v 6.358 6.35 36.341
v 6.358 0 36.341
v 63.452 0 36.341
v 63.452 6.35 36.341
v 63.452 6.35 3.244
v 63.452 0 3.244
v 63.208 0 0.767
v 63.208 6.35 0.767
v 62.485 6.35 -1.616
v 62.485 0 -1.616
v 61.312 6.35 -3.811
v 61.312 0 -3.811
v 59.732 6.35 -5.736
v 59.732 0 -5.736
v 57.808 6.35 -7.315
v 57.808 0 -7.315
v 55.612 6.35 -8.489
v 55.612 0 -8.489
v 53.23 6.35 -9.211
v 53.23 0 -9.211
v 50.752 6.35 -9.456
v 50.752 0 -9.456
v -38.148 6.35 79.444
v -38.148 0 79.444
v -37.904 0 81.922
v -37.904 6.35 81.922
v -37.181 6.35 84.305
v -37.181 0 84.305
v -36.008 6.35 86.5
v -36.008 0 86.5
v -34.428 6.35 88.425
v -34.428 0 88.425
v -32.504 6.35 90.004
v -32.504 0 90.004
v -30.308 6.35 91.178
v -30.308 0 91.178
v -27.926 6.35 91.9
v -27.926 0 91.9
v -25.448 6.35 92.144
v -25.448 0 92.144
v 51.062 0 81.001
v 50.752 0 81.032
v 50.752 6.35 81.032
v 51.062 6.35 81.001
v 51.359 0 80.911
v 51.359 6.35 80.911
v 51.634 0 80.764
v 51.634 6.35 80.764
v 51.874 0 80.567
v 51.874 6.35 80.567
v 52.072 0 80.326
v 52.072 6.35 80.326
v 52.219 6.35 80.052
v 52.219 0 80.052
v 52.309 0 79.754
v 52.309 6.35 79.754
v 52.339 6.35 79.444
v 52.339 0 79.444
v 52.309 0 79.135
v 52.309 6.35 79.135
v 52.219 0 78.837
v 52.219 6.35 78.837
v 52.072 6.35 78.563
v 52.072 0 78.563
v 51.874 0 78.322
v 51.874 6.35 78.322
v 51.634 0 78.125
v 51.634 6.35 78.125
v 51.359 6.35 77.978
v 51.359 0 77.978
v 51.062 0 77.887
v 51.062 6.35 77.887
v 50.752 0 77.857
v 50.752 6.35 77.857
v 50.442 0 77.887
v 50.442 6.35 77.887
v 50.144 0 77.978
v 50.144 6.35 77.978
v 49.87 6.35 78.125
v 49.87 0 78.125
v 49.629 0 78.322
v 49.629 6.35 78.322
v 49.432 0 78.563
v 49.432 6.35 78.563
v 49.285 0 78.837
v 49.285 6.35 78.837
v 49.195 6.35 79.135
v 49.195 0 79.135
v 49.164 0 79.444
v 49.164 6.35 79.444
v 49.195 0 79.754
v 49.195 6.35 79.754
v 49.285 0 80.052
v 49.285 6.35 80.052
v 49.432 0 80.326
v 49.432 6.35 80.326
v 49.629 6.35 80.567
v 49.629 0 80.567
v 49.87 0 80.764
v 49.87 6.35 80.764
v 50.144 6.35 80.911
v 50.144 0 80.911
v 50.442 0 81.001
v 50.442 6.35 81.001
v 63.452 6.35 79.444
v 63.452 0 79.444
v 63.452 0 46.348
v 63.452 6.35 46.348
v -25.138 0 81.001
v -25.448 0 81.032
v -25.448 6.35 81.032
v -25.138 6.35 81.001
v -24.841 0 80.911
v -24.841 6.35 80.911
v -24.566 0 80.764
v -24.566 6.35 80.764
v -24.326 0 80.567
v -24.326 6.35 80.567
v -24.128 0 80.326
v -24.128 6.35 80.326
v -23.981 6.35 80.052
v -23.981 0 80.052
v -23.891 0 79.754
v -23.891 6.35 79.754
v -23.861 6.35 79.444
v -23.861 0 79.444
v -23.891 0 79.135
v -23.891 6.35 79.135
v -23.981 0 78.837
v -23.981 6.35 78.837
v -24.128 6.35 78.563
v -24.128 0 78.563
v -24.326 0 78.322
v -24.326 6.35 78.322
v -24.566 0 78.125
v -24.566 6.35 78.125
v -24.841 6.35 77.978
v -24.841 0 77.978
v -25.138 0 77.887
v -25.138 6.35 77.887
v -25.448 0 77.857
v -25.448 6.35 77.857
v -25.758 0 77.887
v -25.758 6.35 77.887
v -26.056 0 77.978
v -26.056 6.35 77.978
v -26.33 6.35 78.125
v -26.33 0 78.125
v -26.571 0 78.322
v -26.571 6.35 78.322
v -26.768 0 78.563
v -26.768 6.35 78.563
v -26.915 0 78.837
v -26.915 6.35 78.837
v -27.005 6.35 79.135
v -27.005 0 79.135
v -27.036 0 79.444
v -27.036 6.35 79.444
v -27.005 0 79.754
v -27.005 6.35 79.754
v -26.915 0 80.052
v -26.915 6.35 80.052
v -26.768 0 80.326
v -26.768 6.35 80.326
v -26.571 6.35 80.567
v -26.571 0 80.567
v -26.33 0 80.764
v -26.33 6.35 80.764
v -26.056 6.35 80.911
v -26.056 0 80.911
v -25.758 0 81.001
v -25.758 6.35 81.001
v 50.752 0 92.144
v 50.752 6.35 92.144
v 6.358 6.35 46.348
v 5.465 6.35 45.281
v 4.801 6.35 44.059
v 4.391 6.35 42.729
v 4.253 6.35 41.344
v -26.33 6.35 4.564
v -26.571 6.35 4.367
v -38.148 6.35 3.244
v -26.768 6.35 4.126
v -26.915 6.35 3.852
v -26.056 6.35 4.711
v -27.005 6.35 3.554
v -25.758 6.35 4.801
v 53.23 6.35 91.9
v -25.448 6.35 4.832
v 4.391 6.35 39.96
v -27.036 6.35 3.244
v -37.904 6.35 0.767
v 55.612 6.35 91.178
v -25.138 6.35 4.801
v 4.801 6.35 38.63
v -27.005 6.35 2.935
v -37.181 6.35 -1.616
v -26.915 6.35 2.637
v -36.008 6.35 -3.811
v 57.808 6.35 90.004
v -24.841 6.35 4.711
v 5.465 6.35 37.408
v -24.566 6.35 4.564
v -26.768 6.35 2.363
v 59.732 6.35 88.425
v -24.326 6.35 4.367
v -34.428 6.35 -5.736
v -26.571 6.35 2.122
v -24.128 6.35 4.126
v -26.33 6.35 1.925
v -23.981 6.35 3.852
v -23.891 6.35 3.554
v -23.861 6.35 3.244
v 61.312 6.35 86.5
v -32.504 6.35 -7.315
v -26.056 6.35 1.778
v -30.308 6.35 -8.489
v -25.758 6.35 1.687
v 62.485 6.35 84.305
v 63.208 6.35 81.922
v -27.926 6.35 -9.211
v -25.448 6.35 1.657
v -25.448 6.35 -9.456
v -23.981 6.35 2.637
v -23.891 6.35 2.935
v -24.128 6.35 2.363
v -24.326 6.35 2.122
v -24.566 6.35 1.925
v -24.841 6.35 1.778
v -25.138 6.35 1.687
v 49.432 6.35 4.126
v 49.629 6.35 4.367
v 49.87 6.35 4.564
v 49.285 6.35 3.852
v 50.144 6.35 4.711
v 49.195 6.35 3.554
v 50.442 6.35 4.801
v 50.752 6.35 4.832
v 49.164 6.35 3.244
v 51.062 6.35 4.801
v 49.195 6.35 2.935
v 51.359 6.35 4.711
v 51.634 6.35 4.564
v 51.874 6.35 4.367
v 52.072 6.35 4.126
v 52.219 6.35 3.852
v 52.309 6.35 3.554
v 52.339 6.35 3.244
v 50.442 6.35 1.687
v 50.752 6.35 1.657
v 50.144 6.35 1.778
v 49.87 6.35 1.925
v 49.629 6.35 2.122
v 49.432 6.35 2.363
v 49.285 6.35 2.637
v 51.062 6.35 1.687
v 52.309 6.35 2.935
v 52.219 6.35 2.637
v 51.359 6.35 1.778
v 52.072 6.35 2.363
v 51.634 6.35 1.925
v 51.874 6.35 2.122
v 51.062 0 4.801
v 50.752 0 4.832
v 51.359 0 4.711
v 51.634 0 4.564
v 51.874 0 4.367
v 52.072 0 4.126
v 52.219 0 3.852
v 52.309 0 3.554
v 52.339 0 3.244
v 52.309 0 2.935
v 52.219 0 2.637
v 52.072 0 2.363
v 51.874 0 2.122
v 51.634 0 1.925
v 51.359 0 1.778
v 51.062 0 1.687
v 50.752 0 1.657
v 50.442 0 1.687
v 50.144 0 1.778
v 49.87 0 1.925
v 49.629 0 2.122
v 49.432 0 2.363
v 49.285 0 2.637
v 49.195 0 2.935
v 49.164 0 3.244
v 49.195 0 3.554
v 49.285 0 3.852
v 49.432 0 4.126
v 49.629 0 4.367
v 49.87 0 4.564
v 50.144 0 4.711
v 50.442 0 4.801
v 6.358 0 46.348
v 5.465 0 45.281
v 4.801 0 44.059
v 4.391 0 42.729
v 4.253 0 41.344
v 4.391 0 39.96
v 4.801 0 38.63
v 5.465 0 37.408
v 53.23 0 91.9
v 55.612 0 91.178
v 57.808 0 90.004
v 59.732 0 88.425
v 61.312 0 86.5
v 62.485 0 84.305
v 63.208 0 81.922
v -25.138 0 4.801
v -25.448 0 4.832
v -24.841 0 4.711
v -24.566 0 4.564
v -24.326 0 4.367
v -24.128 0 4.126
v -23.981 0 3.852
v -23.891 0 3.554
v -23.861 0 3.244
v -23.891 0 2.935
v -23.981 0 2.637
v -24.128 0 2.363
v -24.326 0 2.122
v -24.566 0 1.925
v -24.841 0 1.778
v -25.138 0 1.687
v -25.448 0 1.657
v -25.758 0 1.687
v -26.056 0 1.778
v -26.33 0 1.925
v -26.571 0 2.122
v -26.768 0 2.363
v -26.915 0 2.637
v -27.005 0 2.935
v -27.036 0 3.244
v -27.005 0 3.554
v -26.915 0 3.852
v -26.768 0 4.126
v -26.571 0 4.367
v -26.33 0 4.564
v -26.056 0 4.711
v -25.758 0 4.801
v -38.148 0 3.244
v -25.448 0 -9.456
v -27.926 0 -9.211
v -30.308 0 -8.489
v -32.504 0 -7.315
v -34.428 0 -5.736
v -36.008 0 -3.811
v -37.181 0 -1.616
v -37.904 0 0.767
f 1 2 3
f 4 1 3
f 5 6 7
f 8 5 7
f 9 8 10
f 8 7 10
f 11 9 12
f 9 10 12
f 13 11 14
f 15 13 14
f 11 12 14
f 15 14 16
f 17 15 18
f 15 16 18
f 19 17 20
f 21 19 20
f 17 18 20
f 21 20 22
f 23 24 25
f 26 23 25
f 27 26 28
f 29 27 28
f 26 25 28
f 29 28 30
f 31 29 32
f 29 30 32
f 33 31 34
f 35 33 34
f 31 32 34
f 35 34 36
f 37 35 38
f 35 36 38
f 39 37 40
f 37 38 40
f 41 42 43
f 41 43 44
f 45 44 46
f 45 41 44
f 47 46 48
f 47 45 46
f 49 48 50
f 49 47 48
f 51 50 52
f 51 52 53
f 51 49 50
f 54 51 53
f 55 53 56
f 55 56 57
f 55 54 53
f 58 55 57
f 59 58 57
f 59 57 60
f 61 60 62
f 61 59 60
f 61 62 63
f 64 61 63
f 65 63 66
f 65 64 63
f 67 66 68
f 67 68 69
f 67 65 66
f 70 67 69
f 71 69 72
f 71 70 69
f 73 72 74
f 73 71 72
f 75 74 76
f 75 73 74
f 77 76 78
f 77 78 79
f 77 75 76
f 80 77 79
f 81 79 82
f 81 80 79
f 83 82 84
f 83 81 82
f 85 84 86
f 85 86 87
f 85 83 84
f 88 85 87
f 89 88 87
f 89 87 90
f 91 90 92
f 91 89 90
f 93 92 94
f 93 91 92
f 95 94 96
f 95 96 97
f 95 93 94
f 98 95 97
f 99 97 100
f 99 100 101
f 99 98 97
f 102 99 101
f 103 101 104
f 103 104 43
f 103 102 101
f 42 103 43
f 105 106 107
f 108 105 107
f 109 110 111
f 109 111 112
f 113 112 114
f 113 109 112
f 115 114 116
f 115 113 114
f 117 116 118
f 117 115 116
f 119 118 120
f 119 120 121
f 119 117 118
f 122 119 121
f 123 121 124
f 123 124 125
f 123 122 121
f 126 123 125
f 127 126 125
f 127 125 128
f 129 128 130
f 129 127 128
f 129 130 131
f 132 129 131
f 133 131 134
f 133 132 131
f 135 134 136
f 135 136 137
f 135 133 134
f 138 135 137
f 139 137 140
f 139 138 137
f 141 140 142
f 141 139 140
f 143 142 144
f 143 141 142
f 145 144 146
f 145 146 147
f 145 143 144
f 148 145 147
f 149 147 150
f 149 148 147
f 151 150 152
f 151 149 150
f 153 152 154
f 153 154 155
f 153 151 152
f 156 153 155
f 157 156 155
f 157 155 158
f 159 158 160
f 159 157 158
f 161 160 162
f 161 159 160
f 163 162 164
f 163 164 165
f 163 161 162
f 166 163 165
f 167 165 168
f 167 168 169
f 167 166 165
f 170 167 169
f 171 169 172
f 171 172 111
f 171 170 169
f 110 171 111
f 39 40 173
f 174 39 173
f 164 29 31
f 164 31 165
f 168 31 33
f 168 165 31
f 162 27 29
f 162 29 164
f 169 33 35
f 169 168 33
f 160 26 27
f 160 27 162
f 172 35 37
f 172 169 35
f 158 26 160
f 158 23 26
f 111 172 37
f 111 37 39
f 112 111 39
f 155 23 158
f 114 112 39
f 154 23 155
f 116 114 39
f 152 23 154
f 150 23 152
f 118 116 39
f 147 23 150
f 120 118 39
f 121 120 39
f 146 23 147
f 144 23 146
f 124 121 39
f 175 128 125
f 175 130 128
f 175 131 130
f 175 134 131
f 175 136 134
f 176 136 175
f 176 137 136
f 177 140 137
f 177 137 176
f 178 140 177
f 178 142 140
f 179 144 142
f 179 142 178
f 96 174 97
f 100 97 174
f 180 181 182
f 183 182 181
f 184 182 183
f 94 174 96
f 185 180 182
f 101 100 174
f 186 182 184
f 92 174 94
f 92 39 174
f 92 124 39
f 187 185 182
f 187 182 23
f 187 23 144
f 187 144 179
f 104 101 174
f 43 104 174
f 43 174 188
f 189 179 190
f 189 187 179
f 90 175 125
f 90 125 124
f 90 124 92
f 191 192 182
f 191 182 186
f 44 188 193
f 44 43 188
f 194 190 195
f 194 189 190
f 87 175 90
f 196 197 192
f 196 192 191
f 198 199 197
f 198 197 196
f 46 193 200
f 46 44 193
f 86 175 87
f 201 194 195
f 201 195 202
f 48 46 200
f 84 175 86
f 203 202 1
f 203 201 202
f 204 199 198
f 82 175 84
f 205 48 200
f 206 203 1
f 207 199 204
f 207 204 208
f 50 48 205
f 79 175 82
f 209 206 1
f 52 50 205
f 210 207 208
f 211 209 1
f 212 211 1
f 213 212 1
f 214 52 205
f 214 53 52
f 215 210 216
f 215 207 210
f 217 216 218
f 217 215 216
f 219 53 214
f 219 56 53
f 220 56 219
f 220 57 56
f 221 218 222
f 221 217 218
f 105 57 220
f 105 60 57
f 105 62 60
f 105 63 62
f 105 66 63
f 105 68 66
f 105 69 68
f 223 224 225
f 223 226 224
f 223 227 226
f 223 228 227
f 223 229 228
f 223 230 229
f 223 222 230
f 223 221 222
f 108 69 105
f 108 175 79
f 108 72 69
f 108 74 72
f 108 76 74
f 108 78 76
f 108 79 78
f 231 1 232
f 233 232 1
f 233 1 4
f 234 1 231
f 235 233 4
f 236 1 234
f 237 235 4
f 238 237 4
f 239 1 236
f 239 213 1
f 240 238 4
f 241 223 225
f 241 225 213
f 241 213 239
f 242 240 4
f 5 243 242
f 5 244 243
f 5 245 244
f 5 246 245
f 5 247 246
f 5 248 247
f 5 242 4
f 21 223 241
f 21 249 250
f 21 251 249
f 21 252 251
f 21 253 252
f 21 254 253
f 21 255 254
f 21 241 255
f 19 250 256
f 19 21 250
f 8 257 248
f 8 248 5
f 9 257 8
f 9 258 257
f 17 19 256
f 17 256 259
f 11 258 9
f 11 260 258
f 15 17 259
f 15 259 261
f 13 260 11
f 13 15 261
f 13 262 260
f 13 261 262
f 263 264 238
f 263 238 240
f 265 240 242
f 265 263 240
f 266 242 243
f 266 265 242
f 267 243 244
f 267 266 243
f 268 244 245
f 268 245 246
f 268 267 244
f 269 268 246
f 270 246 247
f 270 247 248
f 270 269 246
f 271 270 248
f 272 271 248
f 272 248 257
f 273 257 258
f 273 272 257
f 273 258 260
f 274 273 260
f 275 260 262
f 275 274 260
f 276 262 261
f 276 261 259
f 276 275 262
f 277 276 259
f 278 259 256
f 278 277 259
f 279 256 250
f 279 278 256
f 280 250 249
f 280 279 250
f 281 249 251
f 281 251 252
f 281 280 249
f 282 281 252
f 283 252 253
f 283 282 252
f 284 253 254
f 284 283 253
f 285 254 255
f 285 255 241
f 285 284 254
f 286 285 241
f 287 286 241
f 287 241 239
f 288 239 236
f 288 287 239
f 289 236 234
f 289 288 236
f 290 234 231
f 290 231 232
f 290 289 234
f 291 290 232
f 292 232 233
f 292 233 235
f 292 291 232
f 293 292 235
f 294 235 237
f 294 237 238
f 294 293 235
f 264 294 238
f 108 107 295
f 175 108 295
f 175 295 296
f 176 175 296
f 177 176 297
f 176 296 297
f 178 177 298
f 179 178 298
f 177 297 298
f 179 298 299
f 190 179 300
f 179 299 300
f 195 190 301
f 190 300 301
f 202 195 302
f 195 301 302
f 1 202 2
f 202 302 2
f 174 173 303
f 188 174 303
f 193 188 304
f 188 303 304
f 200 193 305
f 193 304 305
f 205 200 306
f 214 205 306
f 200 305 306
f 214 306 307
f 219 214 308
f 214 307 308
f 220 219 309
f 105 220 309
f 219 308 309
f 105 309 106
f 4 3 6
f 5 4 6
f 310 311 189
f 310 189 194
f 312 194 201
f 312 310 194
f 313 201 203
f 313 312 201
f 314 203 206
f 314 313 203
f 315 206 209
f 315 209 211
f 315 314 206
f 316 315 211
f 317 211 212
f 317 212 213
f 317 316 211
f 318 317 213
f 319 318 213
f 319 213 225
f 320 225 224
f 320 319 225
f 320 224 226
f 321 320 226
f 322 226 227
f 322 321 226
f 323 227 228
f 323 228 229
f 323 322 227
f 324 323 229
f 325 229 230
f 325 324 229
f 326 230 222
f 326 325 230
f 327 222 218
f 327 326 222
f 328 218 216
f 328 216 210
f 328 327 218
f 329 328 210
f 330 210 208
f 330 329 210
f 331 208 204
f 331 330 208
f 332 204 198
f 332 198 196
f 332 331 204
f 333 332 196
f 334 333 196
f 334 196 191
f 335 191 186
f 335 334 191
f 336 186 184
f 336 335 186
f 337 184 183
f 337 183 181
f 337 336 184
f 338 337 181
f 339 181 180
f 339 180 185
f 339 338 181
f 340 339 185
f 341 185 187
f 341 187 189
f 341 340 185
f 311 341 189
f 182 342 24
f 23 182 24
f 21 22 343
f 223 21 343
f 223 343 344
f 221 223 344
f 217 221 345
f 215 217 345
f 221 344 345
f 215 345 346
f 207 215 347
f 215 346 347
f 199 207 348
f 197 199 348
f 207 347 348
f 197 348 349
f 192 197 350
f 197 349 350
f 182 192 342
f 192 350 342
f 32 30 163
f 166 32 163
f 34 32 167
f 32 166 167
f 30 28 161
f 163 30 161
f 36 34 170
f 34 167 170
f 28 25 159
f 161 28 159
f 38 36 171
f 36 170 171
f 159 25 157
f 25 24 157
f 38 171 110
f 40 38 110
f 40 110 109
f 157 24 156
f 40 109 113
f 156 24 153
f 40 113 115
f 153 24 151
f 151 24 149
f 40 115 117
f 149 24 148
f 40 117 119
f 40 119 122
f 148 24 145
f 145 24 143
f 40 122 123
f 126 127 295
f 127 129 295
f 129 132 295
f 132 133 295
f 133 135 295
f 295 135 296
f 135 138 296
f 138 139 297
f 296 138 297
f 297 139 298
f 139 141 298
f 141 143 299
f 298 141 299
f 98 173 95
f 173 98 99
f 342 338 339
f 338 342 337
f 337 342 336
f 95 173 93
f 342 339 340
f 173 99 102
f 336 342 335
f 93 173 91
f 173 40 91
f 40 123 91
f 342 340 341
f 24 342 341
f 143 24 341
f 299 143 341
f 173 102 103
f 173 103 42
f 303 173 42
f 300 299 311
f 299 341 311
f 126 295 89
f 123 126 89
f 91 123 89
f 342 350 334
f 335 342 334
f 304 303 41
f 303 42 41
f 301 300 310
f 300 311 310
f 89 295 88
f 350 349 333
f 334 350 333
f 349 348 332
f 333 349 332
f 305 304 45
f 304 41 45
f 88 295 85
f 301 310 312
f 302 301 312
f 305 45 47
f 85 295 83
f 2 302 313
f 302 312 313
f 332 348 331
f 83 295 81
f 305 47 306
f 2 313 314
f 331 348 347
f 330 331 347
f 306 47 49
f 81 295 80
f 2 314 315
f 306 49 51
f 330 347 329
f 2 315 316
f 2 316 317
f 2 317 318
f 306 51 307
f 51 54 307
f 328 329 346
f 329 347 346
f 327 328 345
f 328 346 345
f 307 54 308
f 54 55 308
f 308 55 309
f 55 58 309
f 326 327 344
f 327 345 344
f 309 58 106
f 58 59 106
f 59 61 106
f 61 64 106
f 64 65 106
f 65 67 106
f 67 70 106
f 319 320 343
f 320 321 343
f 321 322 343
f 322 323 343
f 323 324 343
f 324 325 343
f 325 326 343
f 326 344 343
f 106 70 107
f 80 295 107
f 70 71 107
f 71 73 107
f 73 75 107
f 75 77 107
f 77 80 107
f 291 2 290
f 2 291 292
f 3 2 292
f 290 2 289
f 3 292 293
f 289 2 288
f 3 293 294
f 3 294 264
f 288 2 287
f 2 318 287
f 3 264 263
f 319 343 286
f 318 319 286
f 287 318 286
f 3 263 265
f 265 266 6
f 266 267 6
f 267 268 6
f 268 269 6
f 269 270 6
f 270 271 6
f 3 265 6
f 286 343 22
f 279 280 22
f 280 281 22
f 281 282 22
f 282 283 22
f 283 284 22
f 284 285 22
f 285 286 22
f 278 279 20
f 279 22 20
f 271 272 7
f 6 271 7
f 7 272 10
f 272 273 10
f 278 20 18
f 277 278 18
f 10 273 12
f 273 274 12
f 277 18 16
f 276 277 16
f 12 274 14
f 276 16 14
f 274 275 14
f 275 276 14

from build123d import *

# Parameters (mm, degrees)
SKETCH1_R           = 1.5875
BOSS_EXTRUDE1_DEPTH = 6.35


with BuildPart() as part:
    # Sketch1 → Boss-Extrude1 (new body)
    with BuildSketch(Plane(origin=(0, 0, 0), x_dir=(1, 0, 0), z_dir=(0, 1, 0))):
        with BuildLine():
            Line((63.451864614, -36.34068615), (63.451864614, -3.24448615))
            ThreePointArc((63.451864614, -3.24448615), (59.732120735, 5.735769971), (50.751864614, 9.45551385))
            Line((50.751864614, 9.45551385), (-25.448135386, 9.45551385))
            ThreePointArc((-25.448135386, 9.45551385), (-34.428391507, 5.735769971), (-38.148135386, -3.24448615))
            Line((-38.148135386, -3.24448615), (-38.148135386, -79.44448615))
            ThreePointArc((-38.148135386, -79.44448615), (-34.428391507, -88.424742271), (-25.448135386, -92.14448615))
            Line((-25.448135386, -92.14448615), (50.751864614, -92.14448615))
            ThreePointArc((50.751864614, -92.14448615), (59.732120735, -88.424742271), (63.451864614, -79.44448615))
            Line((63.451864614, -79.44448615), (63.451864614, -46.34828615))
            Line((63.451864614, -46.34828615), (18.246283087, -46.34828615))
            Line((18.246283087, -46.34828615), (6.358123925, -46.34828615))
            ThreePointArc((6.358123925, -46.34828615), (4.253221481, -41.34448615), (6.358123925, -36.34068615))
            Line((6.358123925, -36.34068615), (18.246283087, -36.34068615))
            Line((18.246283087, -36.34068615), (63.451864614, -36.34068615))
        make_face()
        with Locations(Location((-25.448135386, -79.44448615, 0), (0, 0, 270))):
            Circle(SKETCH1_R, mode=Mode.SUBTRACT)
        with Locations(Location((50.751864614, -79.44448615, 0), (0, 0, 270))):
            Circle(SKETCH1_R, mode=Mode.SUBTRACT)
        with Locations(Location((50.751864614, -3.24448615, 0), (0, 0, 270))):
            Circle(SKETCH1_R, mode=Mode.SUBTRACT)
        with Locations(Location((-25.448135386, -3.24448615, 0), (0, 0, 270))):
            Circle(SKETCH1_R, mode=Mode.SUBTRACT)
    extrude(amount=BOSS_EXTRUDE1_DEPTH)


solid = part.part
